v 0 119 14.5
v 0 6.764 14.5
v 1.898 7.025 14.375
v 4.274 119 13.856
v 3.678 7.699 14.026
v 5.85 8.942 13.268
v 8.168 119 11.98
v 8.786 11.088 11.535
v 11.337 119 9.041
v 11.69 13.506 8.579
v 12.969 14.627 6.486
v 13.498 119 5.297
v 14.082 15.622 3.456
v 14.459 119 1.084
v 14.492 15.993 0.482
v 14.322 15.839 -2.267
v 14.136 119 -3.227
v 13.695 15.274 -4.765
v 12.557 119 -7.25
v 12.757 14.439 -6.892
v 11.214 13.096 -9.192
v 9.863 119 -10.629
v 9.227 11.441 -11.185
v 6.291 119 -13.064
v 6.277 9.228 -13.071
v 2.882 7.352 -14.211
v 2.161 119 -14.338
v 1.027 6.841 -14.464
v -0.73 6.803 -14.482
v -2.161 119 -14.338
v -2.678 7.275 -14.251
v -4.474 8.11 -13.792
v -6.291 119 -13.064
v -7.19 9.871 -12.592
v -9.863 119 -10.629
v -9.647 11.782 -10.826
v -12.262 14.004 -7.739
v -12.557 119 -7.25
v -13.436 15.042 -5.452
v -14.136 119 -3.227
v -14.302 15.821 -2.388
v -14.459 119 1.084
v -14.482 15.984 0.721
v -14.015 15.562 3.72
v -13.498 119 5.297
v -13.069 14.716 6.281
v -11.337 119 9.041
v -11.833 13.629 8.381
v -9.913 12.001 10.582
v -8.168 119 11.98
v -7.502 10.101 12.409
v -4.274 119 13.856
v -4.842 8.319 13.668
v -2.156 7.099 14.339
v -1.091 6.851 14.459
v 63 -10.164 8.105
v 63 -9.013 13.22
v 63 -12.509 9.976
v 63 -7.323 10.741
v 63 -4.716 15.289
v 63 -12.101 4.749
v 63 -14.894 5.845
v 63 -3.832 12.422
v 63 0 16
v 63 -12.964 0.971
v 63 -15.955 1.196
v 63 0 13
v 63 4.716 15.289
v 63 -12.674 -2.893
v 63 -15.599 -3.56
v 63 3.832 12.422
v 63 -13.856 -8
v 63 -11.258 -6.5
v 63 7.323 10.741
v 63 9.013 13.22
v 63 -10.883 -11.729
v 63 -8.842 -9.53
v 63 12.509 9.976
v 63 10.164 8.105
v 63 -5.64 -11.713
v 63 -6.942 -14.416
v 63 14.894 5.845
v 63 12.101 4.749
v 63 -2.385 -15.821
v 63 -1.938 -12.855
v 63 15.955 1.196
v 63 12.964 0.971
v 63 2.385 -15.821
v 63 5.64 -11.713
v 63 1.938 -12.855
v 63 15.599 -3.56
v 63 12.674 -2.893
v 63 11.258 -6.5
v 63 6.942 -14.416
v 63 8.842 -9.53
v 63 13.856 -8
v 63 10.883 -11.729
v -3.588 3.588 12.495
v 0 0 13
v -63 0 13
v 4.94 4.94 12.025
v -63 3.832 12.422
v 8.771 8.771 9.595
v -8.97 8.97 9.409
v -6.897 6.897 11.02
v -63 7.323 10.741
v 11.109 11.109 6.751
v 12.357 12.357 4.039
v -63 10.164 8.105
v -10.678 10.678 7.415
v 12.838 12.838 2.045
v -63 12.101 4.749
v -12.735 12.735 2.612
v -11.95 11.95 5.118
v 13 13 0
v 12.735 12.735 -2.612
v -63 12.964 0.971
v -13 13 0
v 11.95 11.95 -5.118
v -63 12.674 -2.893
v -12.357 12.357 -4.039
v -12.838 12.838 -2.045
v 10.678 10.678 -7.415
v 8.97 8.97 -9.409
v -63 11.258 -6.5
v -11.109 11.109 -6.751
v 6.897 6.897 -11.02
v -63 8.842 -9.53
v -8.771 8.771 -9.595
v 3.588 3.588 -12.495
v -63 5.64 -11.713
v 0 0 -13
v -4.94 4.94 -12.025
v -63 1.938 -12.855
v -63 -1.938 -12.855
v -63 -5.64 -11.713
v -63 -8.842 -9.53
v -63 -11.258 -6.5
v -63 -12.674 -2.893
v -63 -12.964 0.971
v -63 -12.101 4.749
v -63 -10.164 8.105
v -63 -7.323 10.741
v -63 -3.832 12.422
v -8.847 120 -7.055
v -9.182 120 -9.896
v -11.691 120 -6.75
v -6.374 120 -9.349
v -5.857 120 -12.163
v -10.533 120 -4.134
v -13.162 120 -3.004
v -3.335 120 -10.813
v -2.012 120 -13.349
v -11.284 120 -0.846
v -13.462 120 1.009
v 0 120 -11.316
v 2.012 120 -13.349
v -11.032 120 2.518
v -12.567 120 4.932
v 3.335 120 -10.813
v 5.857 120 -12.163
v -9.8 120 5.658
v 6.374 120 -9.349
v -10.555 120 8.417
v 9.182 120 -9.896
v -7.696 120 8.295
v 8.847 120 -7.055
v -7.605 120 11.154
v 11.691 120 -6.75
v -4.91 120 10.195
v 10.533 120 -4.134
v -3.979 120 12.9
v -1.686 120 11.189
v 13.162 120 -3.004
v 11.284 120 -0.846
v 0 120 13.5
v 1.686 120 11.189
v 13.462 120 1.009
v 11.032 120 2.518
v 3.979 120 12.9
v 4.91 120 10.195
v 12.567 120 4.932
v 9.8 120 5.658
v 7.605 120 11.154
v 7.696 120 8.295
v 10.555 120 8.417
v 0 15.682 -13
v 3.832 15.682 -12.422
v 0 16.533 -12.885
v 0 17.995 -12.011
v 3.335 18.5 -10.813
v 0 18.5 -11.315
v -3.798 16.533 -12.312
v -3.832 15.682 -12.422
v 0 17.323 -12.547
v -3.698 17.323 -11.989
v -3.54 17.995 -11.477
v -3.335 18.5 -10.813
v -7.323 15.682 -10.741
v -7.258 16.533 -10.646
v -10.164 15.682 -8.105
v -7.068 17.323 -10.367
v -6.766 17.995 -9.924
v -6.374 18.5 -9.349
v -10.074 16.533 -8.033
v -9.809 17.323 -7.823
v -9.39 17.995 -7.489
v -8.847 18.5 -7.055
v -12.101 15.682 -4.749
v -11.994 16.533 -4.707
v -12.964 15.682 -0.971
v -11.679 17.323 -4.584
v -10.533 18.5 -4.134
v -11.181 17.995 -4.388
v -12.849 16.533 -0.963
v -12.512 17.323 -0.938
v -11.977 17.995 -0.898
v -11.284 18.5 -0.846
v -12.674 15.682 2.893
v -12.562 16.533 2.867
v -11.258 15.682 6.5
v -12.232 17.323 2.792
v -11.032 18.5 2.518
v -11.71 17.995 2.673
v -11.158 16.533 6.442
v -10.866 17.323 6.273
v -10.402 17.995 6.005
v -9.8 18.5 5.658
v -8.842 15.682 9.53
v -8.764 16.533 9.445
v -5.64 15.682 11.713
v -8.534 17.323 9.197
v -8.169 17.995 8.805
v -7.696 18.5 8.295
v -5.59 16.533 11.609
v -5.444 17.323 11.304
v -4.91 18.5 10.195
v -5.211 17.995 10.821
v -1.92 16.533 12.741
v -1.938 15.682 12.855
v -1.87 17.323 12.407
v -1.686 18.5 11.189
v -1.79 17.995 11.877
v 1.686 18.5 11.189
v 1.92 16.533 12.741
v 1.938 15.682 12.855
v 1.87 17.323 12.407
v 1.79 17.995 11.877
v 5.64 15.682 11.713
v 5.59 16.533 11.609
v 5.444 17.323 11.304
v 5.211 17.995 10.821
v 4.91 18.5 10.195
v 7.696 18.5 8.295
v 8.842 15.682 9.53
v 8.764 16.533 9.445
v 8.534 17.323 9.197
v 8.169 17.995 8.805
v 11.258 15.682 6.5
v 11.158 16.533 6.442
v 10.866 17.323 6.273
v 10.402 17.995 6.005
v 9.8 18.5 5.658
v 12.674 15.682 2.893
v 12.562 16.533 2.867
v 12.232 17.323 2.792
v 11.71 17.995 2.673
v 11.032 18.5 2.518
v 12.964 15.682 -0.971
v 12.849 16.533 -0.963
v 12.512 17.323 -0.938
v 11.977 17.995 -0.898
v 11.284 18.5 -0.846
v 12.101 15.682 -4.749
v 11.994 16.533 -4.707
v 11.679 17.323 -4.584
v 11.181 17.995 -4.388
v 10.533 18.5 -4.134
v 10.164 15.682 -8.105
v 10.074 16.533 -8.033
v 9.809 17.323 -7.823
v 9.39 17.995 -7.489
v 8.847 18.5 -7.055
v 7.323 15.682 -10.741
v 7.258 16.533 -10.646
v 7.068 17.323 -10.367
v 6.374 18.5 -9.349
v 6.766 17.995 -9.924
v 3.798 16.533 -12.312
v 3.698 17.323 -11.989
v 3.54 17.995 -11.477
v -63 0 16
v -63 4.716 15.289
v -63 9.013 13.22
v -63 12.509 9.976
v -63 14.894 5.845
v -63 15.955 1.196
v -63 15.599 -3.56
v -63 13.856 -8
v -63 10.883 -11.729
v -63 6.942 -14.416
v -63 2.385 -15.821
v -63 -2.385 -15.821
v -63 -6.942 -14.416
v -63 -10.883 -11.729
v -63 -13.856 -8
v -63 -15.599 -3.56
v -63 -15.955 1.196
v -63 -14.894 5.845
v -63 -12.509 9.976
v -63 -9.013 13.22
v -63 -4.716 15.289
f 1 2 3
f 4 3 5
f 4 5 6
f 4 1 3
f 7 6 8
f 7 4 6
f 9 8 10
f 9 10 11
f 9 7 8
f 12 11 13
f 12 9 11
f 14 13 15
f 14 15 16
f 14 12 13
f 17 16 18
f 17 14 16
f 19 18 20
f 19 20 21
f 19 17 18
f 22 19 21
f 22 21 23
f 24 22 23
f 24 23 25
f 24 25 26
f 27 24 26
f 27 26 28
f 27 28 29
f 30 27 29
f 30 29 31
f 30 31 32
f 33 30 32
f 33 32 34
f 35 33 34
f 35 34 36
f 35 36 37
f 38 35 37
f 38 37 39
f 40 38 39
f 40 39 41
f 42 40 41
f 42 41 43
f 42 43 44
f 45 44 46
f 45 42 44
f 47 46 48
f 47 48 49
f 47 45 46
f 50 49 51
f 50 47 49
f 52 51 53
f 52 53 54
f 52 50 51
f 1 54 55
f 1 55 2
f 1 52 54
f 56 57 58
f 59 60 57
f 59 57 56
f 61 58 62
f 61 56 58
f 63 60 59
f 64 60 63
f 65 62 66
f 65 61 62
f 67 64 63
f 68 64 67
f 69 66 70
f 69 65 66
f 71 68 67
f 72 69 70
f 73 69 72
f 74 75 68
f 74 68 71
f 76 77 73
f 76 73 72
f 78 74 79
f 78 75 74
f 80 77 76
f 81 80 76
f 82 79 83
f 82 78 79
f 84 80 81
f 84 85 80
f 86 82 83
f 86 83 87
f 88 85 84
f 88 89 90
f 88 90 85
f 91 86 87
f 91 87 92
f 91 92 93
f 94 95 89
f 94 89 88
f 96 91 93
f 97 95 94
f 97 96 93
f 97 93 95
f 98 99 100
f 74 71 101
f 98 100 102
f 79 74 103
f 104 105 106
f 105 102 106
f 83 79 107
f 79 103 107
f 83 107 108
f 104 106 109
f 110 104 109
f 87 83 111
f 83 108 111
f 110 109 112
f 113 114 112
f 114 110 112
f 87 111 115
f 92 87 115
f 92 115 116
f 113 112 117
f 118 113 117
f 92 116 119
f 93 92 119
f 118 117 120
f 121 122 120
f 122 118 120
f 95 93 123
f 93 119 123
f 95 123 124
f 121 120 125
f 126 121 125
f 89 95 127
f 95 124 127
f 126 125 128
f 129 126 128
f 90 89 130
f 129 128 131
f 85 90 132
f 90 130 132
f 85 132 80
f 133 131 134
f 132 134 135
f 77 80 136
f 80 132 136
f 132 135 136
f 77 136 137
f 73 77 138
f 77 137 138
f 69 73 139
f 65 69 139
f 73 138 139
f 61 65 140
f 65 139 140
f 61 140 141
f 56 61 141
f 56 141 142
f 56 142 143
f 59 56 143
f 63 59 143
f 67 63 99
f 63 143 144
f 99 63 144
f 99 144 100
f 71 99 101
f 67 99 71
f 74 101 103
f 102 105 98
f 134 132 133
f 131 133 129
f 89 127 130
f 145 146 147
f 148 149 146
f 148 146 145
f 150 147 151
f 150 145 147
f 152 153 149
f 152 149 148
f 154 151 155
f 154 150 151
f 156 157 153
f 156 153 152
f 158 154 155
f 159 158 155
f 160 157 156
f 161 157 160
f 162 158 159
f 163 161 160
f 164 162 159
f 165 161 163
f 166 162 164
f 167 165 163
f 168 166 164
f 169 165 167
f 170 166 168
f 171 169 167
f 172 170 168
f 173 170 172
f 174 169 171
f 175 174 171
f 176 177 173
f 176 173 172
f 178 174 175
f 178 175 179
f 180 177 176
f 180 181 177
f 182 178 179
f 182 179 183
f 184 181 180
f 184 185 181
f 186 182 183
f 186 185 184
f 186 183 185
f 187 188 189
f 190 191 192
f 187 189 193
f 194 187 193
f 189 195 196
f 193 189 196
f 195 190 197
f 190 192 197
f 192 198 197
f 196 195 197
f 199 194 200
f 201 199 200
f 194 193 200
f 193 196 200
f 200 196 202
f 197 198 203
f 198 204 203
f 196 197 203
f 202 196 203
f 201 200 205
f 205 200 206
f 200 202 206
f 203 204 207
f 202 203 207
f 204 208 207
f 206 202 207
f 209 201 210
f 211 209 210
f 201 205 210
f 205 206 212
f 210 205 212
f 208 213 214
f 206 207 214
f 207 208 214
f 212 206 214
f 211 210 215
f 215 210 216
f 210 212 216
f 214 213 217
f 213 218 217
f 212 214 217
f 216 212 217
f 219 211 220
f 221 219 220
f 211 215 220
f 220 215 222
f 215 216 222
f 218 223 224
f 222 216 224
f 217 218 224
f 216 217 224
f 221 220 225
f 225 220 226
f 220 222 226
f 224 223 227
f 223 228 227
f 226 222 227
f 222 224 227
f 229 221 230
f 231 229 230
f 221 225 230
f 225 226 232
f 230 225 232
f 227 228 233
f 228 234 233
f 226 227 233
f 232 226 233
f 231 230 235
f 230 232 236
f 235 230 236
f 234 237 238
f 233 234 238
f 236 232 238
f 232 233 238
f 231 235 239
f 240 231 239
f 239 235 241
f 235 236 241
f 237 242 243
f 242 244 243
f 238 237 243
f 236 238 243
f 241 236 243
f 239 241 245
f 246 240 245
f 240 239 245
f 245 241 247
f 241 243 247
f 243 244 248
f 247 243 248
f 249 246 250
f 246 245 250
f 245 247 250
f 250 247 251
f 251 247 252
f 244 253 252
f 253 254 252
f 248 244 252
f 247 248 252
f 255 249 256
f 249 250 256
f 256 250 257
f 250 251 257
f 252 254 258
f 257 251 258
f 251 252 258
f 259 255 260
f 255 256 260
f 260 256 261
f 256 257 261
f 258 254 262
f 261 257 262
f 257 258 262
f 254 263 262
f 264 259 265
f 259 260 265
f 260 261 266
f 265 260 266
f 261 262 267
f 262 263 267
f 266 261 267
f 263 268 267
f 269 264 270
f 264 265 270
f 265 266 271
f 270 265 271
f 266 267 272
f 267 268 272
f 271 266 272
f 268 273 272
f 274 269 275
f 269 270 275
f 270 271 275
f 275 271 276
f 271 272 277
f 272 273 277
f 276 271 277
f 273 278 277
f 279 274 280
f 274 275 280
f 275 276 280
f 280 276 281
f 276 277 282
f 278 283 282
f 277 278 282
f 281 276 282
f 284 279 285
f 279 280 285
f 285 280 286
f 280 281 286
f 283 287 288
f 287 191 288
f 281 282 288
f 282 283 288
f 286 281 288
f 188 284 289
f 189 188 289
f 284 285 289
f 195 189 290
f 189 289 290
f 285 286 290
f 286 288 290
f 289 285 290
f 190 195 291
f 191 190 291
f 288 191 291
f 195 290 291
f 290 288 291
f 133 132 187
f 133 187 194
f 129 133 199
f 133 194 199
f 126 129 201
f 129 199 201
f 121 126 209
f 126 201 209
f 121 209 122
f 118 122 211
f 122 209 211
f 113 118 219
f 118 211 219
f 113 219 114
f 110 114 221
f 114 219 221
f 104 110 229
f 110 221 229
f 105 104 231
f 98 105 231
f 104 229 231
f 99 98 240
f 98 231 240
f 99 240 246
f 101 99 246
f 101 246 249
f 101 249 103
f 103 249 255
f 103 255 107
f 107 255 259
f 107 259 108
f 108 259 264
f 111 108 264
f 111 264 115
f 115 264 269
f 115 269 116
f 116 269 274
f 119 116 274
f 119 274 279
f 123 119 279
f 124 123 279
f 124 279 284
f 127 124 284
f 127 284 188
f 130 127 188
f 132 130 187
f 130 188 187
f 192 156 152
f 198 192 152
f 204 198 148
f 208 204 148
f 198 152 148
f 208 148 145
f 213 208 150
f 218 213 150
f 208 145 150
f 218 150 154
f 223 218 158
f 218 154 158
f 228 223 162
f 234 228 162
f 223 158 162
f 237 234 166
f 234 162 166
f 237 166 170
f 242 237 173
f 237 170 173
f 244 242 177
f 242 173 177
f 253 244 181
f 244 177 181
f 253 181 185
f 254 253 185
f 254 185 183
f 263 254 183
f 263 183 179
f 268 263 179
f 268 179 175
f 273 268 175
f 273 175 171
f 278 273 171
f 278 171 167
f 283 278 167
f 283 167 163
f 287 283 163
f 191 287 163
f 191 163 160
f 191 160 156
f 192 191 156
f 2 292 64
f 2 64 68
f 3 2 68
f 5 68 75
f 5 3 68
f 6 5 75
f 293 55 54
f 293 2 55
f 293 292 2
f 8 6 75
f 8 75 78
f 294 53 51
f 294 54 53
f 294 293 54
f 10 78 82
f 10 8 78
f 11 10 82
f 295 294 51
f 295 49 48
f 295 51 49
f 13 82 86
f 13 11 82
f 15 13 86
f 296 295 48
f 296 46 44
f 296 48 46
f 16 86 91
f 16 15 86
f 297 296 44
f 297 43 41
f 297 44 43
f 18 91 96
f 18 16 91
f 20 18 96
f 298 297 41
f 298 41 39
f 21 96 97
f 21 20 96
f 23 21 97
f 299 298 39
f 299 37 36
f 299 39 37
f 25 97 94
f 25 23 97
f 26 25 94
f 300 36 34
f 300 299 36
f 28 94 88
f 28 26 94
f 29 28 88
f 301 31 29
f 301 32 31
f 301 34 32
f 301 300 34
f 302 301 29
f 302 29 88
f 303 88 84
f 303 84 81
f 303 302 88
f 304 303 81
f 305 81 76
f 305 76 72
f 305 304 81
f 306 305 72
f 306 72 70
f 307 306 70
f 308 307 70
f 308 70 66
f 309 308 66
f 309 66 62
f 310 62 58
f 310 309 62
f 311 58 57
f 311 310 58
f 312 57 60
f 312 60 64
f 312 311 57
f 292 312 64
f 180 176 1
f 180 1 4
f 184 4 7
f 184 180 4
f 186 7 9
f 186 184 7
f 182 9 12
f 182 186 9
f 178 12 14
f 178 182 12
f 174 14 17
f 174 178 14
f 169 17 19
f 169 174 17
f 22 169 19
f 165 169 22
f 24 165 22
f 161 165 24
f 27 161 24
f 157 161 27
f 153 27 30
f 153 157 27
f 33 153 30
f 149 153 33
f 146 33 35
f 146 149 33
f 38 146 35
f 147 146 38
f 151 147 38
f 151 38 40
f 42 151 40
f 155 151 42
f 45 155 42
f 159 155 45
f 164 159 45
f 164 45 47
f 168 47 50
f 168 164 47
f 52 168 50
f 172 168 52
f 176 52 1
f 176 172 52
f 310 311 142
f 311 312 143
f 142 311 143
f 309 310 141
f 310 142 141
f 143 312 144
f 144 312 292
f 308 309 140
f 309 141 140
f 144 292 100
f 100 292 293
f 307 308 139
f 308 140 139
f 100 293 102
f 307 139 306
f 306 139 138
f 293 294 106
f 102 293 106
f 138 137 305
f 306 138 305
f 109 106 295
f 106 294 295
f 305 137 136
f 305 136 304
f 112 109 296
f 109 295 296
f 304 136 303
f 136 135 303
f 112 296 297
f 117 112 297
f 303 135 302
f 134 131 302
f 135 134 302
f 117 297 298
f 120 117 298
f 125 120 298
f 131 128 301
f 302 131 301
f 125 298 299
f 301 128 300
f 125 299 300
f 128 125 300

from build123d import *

# Parameters (mm, degrees)
SKETCH1_W                = 126
SKETCH1_H                = 16
M22_CLEARANCE_HOLE1_D    = 26
BOSS_EXTRUDE1_REACH      = 152.735
BOSS_EXTRUDE1_END_RADIUS = 16
SKETCH4_R                = 14.5
CUT_EXTRUDE1_REACH       = 122.529
CUT_EXTRUDE1_END_RADIUS  = 13
SKETCH5_R                = 13
SKETCH6_R                = 9.097381441
CUT_EXTRUDE2_DEPTH       = 0.4
CUT_EXTRUDE2_DRAFT       = -70
SKETCH7_R                = 7.998390473
CUT_EXTRUDE3_DEPTH       = 1.26
CUT_EXTRUDE3_DRAFT       = 50
SKETCH8_R                = 9.5
CUT_EXTRUDE4_DEPTH       = 30.5245
SKETCH9_R                = 11.3155
CUT_EXTRUDE5_DEPTH       = 119.8155
CHAMFER1_SIZE            = 1
FILLET1_R                = 3.2


with BuildPart() as part:
    # Sketch1 → Revolve1 (revolve)
    with BuildSketch(Plane(origin=(0, 0, 0), x_dir=(-1, 0, 0), z_dir=(0, 0, -1)), mode=Mode.PRIVATE) as revolve1_sk:
        with Locations((0, 8)):
            Rectangle(SKETCH1_W, SKETCH1_H)
    revolve(revolve1_sk.sketch.rotate(Axis((63, 0, 0), (-1, 0, 0)), 270), axis=Axis((63, 0, 0), (-1, 0, 0)))

    # M22 Clearance Hole1 (through all)
    with Locations(Plane(origin=(63, 0, 0), x_dir=(0, 0, -1), z_dir=(1, 0, 0))):
        with Locations((0, 0)):
            Hole(M22_CLEARANCE_HOLE1_D / 2)

    # Boss-Extrude1: up to this cylinder (the profile starts outside it)
    boss_extrude1_end = Plane(origin=(0, 0, 0), z_dir=(-1, 0, 0)) * Cylinder(BOSS_EXTRUDE1_END_RADIUS, 338.47, mode=Mode.PRIVATE)
    # Sketch4 → Boss-Extrude1 (add, up to the surface)
    with BuildSketch(Plane(origin=(0, 120, 0), x_dir=(1, 0, 0), z_dir=(0, 1, 0)), mode=Mode.PRIVATE) as boss_extrude1_sk1:
        with Locations(Location((0, 0, 0), (0, 0, 270))):
            Circle(SKETCH4_R)
    boss_extrude1_tool1 = extrude(boss_extrude1_sk1.sketch, amount=-BOSS_EXTRUDE1_REACH, mode=Mode.PRIVATE) - boss_extrude1_end
    add(boss_extrude1_tool1.solids().sort_by_distance((0, 120, 0))[0])

    # Cut-Extrude1: up to this cylinder (the profile starts outside it)
    cut_extrude1_end = Plane(origin=(0, 0, 0), z_dir=(1, 0, 0)) * Cylinder(CUT_EXTRUDE1_END_RADIUS, 272.058, mode=Mode.PRIVATE)
    # Sketch5 → Cut-Extrude1 (cut, up to the surface)
    with BuildSketch(Plane(origin=(0, 18.5, 0), x_dir=(1, 0, 0), z_dir=(0, 1, 0)), mode=Mode.PRIVATE) as cut_extrude1_sk1:
        with Locations(Location((0, 0, 0), (0, 0, 90))):
            Circle(SKETCH5_R)
    cut_extrude1_tool1 = extrude(cut_extrude1_sk1.sketch, amount=-CUT_EXTRUDE1_REACH, mode=Mode.PRIVATE) - cut_extrude1_end
    add(cut_extrude1_tool1.solids().sort_by_distance((0, 18.5, 0))[0], mode=Mode.SUBTRACT)


with BuildPart() as cut_extrude2_tool:
    # Sketch6 → Cut-Extrude2 (with draft: the straight prism first)
    with BuildSketch(Plane.XZ.offset(-18.5)):
        Circle(SKETCH6_R)
    extrude(amount=-CUT_EXTRUDE2_DEPTH)
    # Cut-Extrude2: the draft: its side faces are tilted about the plane it starts from
    cut_extrude2_sides = [cut_extrude2_tool.faces().sort_by_distance(p)[0] for p in [
        (-9.097381441, 18.7, 0),
    ]]
    draft(cut_extrude2_sides, Plane.XZ.offset(-18.5), CUT_EXTRUDE2_DRAFT)


with BuildPart() as part_1:
    add(part.part)

    # Cut-Extrude2: cut by cut_extrude2_tool
    add(cut_extrude2_tool.part, mode=Mode.SUBTRACT)


with BuildPart() as cut_extrude3_tool:
    # Sketch7 → Cut-Extrude3 (with draft: the straight prism first)
    with BuildSketch(Plane.XZ.offset(-18.9)):
        Circle(SKETCH7_R)
    extrude(amount=-CUT_EXTRUDE3_DEPTH)
    # Cut-Extrude3: the draft: its side faces are tilted about the plane it starts from
    cut_extrude3_sides = [cut_extrude3_tool.faces().sort_by_distance(p)[0] for p in [
        (-7.998390473, 19.53, 0),
    ]]
    draft(cut_extrude3_sides, Plane.XZ.offset(-18.9), CUT_EXTRUDE3_DRAFT)


with BuildPart() as part_2:
    add(part_1.part)

    # Cut-Extrude3: cut by cut_extrude3_tool
    add(cut_extrude3_tool.part, mode=Mode.SUBTRACT)

    # Sketch8 → Cut-Extrude4 (cut)
    with BuildSketch(Plane.XZ.offset(-20.16)):
        with Locations(Location((0, 0, 0), (0, 0, 90))):
            Circle(SKETCH8_R)
    extrude(amount=-CUT_EXTRUDE4_DEPTH, mode=Mode.SUBTRACT)

    # Sketch9 → Cut-Extrude5 (cut)
    with BuildSketch(Plane(origin=(0, 120, 0), x_dir=(-1, 0, 0), z_dir=(0, 1, 0))):
        with Locations(Location((0, 0, 0), (0, 0, 270))):
            Circle(SKETCH9_R)
    extrude(amount=-CUT_EXTRUDE5_DEPTH, mode=Mode.SUBTRACT)

    # Chamfer1
    chamfer1_edges = [part_2.edges().sort_by_distance(p)[0] for p in [
        (0, 120, -14.5),
    ]]
    chamfer(chamfer1_edges, length=CHAMFER1_SIZE)

    # Fillet1
    # the kernel refuses this fillet: 3.2 mm, written as the material it adds along each edge
    with BuildSketch(Plane(origin=(0, 18.5, 0), x_dir=(0, 0, -1), z_dir=(1, 0, 0))) as fillet1_piece_1:
        with BuildLine():
            CenterArc((9.8, -2.818378922), FILLET1_R, 0, 61.73217134)
            Line((13, -2.818378922), (13.064, -2.818378922))
            Line((13.064, -2.818378922), (13.064, 0))
            Line((13.064, 0), (13, 0.064))
            ThreePointArc((13, 0.064), (12.15775, 0.064), (11.34581, 0.056367578))
            Line((11.34581, 0.056367578), (11.3155, 0))
        make_face()
    revolve(axis=Axis((0, 18.5, 0), (0, 1, 0)))


solid = part_2.part
